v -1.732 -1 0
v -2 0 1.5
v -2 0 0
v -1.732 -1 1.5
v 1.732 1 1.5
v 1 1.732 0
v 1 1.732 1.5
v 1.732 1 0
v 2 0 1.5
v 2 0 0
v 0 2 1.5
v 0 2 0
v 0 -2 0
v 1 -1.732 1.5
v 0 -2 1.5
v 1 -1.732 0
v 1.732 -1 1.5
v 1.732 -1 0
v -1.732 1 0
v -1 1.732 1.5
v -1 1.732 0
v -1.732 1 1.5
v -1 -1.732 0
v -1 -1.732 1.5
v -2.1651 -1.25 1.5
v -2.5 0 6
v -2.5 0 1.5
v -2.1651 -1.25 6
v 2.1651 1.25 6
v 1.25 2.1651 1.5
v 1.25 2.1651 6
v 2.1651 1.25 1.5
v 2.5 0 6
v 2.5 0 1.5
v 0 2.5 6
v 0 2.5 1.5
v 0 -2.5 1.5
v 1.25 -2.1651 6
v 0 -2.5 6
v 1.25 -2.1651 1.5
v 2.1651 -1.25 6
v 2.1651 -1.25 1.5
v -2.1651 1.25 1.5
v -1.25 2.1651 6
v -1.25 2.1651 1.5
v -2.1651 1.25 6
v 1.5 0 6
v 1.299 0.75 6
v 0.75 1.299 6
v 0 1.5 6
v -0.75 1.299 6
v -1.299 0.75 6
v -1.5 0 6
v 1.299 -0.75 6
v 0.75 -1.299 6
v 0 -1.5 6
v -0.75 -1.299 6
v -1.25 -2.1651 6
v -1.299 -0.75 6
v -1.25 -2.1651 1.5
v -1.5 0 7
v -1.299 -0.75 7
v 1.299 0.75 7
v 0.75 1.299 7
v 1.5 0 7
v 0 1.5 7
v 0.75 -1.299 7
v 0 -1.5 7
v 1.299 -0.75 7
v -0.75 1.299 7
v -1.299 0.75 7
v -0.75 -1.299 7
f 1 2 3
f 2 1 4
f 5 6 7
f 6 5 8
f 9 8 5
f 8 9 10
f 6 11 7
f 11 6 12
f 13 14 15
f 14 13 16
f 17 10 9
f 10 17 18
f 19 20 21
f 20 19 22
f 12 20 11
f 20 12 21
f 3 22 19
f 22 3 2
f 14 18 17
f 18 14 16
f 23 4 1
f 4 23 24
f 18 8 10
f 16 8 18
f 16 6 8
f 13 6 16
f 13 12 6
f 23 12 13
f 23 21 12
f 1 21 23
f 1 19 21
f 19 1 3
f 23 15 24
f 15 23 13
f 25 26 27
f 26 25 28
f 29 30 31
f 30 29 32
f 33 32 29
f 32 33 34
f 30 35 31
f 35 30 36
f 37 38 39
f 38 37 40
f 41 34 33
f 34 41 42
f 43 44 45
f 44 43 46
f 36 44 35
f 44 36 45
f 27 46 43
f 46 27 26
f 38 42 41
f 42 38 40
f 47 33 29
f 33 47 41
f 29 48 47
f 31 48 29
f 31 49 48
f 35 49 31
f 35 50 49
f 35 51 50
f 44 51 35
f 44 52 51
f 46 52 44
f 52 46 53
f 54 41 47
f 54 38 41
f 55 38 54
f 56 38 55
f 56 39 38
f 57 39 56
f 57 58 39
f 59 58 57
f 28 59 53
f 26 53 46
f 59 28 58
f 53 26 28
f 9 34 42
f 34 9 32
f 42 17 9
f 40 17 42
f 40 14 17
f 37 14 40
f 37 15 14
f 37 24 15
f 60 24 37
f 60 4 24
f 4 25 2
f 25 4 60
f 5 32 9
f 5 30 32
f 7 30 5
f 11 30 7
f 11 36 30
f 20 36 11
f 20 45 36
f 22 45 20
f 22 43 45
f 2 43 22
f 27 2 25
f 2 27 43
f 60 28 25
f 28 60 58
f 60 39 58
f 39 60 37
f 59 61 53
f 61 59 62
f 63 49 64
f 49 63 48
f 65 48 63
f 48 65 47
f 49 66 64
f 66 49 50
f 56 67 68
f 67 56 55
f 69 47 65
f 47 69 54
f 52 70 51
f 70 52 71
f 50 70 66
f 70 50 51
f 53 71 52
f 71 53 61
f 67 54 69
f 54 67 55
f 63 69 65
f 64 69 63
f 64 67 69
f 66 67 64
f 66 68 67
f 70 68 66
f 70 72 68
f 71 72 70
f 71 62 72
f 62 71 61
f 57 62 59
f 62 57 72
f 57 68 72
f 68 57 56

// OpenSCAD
// brick round 1x1

// external vars #########################

// part ##################################

module brick_round_1x1() {
  $fn = 12;
  union() {
    cylinder(h=2,d=4);
    translate([0,0,1.5]) cylinder(h=4.5,d=5);
    translate([0,0,5.5]) cylinder(h=1.5,d=3);
  }
}

brick_round_1x1();
